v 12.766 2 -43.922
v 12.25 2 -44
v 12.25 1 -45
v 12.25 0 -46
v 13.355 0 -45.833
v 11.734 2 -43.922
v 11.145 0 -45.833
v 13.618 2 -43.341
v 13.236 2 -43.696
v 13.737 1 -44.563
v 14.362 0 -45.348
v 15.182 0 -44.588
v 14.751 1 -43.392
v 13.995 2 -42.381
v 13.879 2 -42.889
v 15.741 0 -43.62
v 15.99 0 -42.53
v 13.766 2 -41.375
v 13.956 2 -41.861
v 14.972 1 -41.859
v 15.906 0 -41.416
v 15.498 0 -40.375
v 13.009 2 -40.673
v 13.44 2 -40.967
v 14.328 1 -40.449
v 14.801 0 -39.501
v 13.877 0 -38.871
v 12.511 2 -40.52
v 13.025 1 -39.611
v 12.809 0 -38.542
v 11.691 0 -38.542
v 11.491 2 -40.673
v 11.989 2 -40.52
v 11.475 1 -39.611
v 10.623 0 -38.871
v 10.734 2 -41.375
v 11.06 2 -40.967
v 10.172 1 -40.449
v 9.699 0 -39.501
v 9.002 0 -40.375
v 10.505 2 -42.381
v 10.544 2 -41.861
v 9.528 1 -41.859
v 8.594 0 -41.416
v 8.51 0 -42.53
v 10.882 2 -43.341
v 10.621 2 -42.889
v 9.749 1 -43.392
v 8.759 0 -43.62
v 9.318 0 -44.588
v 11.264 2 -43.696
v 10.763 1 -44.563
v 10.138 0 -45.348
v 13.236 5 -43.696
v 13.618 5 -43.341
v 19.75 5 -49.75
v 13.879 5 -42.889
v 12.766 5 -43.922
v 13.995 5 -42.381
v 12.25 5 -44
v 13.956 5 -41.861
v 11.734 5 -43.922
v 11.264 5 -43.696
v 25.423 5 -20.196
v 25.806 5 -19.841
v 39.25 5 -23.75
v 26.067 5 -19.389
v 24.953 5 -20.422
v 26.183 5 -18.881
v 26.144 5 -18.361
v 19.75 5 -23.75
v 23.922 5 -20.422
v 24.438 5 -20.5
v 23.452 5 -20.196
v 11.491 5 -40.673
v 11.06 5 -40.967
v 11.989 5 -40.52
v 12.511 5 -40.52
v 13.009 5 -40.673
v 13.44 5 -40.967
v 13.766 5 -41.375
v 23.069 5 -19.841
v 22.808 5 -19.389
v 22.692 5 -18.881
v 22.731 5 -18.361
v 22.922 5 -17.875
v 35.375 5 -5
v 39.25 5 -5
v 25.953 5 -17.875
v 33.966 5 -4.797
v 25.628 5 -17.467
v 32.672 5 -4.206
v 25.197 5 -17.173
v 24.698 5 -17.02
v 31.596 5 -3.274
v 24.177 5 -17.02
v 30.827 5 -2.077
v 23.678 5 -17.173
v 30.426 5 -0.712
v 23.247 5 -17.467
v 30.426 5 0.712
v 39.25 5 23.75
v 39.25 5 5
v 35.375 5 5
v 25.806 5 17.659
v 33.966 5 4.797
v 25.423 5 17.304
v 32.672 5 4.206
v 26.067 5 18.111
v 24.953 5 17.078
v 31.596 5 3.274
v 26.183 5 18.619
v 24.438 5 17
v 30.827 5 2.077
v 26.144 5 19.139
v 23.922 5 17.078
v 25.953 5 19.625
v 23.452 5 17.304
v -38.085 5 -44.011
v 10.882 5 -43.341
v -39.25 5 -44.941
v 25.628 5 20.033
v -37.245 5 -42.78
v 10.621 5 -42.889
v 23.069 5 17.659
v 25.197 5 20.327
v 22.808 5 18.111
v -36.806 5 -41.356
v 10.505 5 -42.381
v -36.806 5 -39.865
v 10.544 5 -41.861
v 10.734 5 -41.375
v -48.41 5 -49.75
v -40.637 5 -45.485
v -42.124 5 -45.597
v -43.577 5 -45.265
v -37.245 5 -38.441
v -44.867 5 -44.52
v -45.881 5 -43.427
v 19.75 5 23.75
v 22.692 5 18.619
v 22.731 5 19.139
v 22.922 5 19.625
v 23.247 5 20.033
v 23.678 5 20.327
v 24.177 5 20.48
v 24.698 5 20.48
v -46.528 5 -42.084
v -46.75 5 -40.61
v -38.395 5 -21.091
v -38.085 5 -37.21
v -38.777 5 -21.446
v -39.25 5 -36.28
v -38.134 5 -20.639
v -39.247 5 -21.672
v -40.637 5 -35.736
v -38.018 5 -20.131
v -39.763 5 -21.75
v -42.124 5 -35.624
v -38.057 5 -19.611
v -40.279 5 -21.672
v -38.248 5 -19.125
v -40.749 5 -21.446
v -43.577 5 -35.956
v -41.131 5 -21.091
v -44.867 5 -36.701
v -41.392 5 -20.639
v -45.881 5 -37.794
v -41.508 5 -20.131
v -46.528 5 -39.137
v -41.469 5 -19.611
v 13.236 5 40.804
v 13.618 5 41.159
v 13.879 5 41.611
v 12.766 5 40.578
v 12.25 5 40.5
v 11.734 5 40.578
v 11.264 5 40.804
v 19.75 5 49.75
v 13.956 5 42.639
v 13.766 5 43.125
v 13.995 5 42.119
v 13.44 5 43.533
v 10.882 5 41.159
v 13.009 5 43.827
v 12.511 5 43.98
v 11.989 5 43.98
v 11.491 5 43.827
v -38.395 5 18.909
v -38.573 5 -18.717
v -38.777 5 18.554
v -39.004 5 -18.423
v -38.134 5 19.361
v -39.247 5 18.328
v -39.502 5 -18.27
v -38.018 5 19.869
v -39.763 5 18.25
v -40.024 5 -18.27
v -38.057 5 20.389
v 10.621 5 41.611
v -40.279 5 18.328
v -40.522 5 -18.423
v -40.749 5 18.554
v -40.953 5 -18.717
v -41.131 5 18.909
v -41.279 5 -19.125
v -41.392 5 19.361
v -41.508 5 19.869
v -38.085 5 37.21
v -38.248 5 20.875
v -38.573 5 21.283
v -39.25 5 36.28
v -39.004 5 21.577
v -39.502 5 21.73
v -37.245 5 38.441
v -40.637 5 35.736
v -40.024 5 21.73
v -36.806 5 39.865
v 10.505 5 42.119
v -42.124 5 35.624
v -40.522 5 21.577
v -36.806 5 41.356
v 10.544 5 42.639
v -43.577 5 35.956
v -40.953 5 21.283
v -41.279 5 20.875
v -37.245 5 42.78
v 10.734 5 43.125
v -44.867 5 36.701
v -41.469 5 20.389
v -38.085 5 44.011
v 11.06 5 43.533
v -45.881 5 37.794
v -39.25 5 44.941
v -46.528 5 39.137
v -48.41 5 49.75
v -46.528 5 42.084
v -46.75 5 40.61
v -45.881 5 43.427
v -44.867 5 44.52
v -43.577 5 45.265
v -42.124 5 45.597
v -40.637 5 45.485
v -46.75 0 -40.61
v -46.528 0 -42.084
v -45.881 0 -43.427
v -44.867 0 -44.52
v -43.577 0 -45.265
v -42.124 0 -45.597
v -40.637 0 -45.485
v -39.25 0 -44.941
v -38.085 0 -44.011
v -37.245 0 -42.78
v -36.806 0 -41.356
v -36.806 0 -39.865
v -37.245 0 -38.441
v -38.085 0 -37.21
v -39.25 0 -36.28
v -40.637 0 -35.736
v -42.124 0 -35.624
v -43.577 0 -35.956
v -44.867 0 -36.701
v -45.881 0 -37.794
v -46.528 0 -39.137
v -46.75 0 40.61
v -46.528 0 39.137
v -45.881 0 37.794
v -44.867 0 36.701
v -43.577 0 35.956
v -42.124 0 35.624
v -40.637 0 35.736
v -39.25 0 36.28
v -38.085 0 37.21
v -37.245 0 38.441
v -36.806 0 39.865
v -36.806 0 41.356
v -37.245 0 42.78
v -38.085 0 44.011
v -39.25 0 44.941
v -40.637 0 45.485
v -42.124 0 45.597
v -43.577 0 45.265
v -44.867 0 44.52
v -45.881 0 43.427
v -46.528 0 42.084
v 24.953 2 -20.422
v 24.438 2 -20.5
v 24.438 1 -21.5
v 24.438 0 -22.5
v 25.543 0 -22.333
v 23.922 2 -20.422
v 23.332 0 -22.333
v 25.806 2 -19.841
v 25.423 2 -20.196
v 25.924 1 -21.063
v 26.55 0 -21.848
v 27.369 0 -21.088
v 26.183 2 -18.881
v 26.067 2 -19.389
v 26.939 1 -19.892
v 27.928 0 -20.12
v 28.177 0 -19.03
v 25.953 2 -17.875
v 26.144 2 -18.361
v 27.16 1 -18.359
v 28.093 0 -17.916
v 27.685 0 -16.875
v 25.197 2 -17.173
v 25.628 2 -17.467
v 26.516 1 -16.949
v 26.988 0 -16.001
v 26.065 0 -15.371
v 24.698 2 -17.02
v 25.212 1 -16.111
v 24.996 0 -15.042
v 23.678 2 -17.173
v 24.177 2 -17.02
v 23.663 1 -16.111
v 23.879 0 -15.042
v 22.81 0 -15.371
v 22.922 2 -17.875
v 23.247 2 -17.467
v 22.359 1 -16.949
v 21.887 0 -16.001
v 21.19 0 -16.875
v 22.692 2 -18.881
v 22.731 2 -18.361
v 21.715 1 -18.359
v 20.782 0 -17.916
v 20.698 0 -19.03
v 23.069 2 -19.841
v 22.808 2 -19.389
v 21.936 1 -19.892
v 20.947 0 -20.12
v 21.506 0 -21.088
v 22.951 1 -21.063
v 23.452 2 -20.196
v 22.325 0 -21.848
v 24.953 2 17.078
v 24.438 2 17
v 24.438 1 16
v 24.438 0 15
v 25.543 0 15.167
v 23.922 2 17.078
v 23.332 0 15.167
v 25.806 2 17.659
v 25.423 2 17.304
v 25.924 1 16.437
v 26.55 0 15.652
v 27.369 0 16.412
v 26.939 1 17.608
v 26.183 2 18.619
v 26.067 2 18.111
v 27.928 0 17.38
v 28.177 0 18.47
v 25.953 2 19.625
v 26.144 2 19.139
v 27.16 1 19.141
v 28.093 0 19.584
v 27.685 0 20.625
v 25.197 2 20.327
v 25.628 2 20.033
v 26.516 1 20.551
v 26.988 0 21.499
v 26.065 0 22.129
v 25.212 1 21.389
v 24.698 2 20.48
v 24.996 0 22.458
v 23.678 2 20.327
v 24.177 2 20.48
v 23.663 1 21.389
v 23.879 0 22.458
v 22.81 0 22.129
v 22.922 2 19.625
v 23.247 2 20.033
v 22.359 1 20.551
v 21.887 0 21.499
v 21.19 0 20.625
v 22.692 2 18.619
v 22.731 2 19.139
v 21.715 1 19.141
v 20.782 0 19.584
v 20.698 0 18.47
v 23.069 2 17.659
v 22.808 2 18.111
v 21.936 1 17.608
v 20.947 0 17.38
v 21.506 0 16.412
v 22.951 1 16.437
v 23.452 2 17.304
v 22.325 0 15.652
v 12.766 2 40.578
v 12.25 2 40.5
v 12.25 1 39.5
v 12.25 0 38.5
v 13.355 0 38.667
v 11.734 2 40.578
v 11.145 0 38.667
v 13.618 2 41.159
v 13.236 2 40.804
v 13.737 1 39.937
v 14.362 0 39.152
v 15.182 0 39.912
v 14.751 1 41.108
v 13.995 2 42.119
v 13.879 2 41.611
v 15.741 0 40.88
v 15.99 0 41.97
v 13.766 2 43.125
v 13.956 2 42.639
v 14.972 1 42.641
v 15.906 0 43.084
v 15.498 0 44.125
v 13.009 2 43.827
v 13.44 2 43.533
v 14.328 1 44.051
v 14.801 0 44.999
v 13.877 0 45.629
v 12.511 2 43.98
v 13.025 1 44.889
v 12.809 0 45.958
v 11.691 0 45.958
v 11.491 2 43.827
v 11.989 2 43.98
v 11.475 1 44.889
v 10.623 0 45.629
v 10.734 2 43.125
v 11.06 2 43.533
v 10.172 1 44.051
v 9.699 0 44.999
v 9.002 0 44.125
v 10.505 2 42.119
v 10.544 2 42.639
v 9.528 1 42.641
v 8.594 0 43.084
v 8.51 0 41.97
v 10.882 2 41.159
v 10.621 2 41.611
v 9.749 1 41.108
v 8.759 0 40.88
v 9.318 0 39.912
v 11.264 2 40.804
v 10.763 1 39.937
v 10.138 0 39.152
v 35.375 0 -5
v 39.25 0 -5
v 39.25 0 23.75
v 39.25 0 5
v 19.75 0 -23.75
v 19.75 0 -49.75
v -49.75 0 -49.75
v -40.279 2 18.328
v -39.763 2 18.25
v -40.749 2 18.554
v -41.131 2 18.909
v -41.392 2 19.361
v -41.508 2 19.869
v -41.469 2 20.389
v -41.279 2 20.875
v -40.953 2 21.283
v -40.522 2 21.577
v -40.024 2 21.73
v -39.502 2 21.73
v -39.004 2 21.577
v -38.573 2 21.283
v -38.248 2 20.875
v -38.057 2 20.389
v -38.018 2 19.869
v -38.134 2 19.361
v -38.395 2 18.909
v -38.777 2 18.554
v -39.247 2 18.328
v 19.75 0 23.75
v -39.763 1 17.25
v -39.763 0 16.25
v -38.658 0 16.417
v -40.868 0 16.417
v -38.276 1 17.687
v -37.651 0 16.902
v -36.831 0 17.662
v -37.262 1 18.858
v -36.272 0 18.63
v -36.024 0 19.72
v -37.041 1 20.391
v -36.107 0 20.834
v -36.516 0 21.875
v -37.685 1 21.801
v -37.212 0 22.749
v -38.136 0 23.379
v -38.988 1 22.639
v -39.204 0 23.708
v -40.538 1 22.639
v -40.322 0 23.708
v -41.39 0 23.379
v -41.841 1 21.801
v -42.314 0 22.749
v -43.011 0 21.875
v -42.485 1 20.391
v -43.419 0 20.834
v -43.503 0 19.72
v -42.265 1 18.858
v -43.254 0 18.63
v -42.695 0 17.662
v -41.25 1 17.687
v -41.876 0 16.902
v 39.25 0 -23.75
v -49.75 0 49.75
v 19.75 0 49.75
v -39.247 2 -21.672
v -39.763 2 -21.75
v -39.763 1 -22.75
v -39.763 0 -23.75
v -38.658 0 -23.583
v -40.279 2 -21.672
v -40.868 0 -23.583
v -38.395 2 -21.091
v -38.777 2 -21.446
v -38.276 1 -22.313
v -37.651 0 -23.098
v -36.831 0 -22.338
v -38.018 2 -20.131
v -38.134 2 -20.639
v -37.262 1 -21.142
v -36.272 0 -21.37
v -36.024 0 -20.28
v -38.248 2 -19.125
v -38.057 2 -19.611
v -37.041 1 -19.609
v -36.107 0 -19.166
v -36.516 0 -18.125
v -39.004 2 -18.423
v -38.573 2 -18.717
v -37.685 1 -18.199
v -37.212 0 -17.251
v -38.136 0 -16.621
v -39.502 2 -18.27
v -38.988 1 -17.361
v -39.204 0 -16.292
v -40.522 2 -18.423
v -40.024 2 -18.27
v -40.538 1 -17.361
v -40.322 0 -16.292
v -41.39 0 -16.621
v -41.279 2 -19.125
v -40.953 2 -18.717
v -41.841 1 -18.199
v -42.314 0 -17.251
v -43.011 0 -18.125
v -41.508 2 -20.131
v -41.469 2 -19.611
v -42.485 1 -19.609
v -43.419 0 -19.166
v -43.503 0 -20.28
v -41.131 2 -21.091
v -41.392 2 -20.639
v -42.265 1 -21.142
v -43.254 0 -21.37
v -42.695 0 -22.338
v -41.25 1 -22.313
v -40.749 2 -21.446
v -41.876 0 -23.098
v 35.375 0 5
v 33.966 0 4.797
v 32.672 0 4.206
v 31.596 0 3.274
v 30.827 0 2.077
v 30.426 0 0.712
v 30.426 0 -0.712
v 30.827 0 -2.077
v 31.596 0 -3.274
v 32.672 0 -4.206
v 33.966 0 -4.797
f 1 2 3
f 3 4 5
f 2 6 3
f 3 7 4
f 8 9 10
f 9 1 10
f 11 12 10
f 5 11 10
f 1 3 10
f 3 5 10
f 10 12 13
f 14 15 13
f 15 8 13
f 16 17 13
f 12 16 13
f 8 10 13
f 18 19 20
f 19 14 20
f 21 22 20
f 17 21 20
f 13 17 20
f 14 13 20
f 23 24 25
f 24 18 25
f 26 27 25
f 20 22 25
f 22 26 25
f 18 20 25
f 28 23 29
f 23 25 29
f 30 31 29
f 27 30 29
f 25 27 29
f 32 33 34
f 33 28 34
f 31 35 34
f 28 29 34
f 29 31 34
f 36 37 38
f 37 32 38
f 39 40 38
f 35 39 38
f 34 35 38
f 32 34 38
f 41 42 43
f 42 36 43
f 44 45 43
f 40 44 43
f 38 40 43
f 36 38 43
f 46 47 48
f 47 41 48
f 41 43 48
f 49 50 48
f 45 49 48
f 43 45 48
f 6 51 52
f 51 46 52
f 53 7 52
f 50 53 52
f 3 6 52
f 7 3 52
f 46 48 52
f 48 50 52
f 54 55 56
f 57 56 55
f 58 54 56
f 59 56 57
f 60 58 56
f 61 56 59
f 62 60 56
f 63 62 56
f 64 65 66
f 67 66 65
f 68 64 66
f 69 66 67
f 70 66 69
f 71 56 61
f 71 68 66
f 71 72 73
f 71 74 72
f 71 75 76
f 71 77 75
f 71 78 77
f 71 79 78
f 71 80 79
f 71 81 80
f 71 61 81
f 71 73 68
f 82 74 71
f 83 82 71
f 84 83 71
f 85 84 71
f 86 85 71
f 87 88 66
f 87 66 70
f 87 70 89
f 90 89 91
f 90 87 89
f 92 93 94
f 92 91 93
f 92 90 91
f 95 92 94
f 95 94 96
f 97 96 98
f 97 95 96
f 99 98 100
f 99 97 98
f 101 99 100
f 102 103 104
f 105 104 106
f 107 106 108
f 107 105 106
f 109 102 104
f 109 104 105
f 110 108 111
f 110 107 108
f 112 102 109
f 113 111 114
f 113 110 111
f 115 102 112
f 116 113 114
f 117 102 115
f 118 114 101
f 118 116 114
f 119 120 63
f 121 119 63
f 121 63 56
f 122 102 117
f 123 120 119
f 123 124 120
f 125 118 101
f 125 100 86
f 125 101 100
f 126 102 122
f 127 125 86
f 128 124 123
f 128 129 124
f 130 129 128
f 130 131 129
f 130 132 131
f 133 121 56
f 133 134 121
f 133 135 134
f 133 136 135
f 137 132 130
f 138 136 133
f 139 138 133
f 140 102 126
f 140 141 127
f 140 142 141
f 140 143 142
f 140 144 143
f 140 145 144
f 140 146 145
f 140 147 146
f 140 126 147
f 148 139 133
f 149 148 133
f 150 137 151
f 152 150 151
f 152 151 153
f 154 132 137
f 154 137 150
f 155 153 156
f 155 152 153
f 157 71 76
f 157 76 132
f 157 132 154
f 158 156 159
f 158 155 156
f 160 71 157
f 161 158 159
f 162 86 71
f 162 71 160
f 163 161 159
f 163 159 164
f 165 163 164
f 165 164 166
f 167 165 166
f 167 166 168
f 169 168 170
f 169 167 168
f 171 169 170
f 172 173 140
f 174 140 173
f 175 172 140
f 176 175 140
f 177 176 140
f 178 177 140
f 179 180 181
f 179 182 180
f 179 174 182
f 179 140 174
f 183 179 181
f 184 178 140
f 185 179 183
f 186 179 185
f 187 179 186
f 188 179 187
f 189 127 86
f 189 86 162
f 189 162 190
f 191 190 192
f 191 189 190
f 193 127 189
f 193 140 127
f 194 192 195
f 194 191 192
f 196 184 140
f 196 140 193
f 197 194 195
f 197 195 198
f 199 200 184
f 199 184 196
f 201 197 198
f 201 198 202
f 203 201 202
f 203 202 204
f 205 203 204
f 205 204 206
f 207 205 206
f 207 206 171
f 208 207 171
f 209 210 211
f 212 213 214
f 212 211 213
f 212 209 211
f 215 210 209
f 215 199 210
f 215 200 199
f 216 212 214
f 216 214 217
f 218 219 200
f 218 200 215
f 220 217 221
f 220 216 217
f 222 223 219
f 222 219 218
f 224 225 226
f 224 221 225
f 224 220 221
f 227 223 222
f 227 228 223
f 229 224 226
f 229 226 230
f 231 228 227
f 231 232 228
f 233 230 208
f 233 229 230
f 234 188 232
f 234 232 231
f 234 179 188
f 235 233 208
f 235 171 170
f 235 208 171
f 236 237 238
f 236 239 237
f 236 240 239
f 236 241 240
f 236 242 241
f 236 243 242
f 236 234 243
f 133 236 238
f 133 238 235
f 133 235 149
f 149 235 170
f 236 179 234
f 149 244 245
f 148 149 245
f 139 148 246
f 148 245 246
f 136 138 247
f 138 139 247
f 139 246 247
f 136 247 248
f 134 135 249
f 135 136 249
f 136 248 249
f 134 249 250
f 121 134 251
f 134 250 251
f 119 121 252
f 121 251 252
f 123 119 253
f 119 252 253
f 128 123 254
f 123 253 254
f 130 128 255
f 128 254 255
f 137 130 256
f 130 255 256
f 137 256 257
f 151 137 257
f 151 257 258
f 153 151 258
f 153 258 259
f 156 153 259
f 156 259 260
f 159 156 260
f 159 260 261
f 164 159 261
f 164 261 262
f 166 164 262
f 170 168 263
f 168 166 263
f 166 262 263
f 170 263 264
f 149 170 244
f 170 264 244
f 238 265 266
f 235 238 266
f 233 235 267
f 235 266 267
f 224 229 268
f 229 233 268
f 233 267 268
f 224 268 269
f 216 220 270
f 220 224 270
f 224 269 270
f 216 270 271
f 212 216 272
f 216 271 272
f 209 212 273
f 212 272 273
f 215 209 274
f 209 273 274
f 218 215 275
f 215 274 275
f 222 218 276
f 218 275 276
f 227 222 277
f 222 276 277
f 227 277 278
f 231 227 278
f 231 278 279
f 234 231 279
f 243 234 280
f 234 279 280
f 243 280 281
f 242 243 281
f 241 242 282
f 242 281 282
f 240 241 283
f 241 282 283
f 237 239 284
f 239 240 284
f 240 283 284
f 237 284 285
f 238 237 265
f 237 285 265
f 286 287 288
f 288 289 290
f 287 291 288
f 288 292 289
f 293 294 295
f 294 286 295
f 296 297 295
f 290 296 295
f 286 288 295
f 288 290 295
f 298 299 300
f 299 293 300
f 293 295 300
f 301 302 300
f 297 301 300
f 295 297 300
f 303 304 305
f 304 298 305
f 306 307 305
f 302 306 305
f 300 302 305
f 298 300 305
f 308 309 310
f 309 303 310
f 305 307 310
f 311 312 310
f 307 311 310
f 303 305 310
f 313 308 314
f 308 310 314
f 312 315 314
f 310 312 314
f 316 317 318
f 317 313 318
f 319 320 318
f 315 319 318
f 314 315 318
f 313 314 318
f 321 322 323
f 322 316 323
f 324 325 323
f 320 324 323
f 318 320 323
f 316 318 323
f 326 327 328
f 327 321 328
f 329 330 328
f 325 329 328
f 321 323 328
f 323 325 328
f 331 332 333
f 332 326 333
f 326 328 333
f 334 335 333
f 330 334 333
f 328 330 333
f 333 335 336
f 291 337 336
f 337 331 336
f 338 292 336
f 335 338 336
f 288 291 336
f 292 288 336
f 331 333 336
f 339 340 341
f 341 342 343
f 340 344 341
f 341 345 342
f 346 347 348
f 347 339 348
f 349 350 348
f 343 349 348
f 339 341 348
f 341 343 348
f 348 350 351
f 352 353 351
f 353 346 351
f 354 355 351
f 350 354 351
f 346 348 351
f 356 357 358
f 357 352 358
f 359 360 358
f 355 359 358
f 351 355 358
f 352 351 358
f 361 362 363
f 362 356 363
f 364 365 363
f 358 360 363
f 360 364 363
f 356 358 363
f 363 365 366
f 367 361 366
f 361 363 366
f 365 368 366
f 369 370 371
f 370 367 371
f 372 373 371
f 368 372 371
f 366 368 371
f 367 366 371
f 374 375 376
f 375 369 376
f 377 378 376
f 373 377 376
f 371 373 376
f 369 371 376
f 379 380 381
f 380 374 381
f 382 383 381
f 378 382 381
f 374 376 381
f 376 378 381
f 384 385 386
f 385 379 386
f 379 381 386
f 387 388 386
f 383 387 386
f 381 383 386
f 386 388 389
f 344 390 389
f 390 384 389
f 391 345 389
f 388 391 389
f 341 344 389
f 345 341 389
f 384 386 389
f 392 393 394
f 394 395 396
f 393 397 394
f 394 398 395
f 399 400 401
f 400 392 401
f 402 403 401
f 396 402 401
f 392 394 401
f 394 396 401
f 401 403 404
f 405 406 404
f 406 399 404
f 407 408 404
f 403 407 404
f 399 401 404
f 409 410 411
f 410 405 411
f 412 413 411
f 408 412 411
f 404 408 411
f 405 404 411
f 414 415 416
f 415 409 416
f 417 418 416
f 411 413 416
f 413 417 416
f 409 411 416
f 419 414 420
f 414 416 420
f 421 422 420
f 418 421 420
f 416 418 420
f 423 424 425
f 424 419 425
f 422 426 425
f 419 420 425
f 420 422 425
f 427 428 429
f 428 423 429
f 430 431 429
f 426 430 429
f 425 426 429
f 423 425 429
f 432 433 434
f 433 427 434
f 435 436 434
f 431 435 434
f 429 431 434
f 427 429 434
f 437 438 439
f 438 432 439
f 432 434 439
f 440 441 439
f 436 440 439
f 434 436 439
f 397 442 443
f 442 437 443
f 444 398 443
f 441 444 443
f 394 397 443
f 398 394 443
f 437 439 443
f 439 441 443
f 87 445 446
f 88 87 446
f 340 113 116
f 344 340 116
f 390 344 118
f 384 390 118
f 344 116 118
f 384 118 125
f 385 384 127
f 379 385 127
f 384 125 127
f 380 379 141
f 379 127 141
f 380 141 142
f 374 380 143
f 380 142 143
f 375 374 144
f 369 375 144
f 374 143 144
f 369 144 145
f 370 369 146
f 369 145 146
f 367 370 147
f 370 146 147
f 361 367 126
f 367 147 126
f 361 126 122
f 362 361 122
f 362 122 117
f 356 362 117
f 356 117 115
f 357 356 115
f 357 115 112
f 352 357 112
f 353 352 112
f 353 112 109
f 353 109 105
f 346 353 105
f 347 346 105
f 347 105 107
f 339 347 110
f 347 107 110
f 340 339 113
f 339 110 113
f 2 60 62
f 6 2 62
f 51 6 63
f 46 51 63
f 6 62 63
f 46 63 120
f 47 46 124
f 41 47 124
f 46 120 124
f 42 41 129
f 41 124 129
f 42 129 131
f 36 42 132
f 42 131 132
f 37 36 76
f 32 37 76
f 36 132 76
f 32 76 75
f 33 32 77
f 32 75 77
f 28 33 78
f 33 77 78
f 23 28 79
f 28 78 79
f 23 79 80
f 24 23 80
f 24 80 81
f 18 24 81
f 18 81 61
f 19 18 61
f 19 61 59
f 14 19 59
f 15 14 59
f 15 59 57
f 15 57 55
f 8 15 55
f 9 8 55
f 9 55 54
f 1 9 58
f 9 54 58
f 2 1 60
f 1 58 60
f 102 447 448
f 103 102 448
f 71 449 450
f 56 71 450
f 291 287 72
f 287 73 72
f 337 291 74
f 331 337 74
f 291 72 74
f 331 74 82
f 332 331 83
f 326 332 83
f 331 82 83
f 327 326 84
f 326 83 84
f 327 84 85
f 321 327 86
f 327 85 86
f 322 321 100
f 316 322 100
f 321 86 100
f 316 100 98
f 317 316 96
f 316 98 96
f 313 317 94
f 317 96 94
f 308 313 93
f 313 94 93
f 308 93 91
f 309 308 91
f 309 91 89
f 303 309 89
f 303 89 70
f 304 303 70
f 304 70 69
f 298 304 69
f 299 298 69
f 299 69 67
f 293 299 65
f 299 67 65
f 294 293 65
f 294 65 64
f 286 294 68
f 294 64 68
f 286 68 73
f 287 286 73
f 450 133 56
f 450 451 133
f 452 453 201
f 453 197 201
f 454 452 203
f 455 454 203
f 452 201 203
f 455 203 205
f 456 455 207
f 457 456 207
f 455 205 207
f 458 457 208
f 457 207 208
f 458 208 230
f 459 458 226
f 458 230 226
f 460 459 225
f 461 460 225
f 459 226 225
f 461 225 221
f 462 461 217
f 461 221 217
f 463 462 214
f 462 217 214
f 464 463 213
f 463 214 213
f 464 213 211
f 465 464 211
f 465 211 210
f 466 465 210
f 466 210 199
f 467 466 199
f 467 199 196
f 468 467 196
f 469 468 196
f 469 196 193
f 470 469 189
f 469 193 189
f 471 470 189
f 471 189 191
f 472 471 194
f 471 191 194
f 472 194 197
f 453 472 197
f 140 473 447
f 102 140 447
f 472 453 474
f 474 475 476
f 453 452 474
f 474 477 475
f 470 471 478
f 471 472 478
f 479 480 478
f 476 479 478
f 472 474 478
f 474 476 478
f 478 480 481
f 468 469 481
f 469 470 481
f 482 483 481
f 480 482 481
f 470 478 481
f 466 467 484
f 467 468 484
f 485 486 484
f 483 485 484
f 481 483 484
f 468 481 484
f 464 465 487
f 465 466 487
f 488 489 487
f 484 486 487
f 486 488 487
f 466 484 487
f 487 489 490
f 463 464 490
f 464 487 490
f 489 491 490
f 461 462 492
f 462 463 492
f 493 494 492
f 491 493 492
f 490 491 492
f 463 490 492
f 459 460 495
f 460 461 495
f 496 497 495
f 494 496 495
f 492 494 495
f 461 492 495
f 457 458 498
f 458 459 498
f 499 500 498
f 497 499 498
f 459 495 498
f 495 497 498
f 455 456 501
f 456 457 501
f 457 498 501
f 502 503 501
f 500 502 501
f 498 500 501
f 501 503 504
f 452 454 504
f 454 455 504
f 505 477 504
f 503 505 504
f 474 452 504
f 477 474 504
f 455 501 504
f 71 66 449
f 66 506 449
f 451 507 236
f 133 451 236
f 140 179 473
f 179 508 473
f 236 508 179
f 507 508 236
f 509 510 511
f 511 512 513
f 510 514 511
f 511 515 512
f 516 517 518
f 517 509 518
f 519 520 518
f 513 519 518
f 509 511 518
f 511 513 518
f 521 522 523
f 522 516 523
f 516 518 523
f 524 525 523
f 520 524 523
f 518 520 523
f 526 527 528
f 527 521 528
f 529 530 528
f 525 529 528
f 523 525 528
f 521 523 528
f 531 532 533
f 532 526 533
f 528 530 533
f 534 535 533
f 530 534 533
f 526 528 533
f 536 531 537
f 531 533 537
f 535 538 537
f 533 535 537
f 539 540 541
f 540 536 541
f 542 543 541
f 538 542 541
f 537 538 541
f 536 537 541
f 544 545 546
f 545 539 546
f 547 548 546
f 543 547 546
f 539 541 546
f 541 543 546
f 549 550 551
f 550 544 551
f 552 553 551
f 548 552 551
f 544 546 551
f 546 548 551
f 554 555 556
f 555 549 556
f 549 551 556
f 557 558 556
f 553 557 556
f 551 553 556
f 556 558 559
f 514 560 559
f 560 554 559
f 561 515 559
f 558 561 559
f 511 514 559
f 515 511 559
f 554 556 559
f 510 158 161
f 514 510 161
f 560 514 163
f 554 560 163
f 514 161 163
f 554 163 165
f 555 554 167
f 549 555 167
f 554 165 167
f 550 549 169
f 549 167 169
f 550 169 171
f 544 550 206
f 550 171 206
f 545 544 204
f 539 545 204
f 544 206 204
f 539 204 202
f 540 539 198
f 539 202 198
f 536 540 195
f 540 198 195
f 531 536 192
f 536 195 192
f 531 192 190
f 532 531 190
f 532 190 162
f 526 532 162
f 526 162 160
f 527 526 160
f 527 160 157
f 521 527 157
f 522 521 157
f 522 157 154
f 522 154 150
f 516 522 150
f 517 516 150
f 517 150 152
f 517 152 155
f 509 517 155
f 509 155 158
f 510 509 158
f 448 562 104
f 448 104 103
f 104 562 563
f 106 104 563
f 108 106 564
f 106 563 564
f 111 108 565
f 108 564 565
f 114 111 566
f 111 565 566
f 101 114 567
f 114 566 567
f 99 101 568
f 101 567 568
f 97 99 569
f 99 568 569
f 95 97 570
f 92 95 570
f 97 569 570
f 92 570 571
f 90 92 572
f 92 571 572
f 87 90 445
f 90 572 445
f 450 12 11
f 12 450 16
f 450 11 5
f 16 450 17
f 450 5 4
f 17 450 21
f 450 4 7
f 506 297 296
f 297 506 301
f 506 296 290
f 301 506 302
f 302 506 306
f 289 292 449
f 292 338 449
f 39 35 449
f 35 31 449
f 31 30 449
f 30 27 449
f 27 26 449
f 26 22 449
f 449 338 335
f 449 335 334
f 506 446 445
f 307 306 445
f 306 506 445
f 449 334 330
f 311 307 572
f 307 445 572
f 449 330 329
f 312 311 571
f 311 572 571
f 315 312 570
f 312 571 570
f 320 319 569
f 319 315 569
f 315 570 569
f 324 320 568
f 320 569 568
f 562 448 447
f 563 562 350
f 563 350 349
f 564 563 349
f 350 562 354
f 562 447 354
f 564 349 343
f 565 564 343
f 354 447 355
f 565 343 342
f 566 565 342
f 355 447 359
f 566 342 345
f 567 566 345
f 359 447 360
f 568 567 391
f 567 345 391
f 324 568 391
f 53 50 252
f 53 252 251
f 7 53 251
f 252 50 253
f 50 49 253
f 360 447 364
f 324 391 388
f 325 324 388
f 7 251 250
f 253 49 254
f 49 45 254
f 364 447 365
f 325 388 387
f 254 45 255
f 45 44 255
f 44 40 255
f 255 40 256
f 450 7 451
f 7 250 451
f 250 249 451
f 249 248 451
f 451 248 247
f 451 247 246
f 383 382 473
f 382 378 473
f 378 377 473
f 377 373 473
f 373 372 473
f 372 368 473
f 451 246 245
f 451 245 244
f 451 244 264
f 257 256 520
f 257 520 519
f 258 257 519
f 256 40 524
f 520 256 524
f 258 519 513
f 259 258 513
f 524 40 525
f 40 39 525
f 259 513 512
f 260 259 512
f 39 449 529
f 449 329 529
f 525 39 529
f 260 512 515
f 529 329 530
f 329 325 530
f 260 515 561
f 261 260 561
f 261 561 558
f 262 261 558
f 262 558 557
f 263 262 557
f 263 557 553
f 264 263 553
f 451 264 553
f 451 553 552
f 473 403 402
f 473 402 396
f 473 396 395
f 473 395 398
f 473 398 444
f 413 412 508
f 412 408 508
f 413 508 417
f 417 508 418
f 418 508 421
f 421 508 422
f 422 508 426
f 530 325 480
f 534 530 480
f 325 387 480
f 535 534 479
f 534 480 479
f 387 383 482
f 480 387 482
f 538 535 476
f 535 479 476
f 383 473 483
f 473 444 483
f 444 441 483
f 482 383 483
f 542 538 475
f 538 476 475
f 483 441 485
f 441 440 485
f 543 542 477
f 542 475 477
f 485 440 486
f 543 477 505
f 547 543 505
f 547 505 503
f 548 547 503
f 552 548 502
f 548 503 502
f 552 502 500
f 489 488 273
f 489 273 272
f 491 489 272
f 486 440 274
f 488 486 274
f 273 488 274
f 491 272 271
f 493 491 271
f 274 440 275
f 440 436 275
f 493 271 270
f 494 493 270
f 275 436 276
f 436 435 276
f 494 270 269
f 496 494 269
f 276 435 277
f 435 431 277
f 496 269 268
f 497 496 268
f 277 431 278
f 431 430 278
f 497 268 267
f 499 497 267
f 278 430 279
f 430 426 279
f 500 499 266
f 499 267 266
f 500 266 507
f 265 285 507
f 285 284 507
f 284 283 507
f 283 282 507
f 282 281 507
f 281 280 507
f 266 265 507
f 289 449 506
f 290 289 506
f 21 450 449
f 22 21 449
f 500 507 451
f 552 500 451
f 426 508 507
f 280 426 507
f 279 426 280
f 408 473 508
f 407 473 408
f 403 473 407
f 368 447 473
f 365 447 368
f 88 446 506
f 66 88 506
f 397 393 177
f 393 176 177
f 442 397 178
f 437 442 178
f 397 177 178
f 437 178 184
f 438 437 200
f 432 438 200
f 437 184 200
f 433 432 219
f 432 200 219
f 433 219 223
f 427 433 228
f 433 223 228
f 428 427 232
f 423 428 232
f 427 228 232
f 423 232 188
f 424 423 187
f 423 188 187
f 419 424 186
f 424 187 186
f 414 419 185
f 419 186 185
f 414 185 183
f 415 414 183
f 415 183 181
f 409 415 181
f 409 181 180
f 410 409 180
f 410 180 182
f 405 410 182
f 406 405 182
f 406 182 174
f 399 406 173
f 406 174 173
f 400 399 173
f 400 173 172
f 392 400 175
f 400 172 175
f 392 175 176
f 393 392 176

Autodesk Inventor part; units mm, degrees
ref_plane "YZ Plane" through (0, 0, 0) normal (1, 0, 0) x (0, 1, 0)
ref_plane "XZ Plane" through (0, 0, 0) normal (0, 1, 0) x (-1, 0, 0)
ref_plane "XY Plane" through (0, 0, 0) normal (0, 0, 1) x (1, 0, 0)
sketch "Náčrt1" plane through (0, 0, 0) normal (0, 1, 0) x (-1, 0, 0)
  line L0 (-49.75, 49.75) -> (49.75, 49.75)
  line L1 (49.75, 49.75) -> (49.75, -49.75)
  line L2 (49.75, -49.75) -> (-49.75, -49.75)
  line L3 (-49.75, -49.75) -> (-49.75, 49.75)
  line L4 (-49.75, 49.75) -> (49.75, -49.75) construction
  line L5 (49.75, 49.75) -> (-49.75, -49.75) construction
  line L6 (-19.75, 49.75) -> (-19.75, 23.75)
  line L7 (-19.75, 23.75) -> (-49.75, 23.75)
  line L8 (-49.75, -23.75) -> (-19.75, -23.75)
  line L9 (-19.75, -23.75) -> (-19.75, -49.75)
  circle A0 centre (-24.4375, -18.75) radius 1.75
  circle A1 centre (-24.4375, 18.75) radius 1.75
  line L10 (-39.25, 23.75) -> (-39.25, -23.75)
  circle A2 centre (-12.25, -42.25) radius 1.75
  circle A3 centre (39.7631, -20) radius 1.75
  circle A4 centre (39.7631, 20) radius 1.75
  circle A5 centre (-12.25, 42.25) radius 1.75
  circle A6 centre (41.75, 40.6105) radius 5
  circle A7 centre (41.75, -40.6105) radius 5
  line L11 (41.75, 40.6105) -> (41.75, 49.75) construction
  line L12 (41.75, -40.6105) -> (41.75, -49.75) construction
  circle A8 centre (-35.375, 0) radius 5
  line L13 (-35.375, 5) -> (-39.25, 5)
  line L14 (-35.375, -5) -> (-39.25, -5)
  line L15 (39.7631, 20) -> (39.7631, 0) construction
  line L16 (39.7631, 0) -> (39.7631, -20) construction
  point P0 (0, 0)
  point P1 (-34.75, 23.75)
  dimension "d0" = 99.5
  dimension "d1" = 99.5
  dimension "d2" = 30
  dimension "d3" = 26
  dimension "d4" = 10.5
  dimension "d5" = 3.5
  dimension "d7" = 7.5
  dimension "d8" = 7.5
  dimension "d9" = 5
  dimension "d10" = 5
  dimension "d11" = 10.3125
  dimension "d12" = 7.5
  dimension "d13" = 9.9869
  dimension "d26" = 81.221
  dimension "d27" = 10
  dimension "d28" = 8
  dimension "d29" = 10
  dimension "d30" = 3.875
  dimension "d31" = 40
extrude "Vysunutí1" add sketch "Náčrt1" along normal blind 5 contours L0 L1 L2 L9 L8 L10 L14 A8 L13 L7 L6 | A0 | A1 | A2 | A3 | A4 | A5
sketch "Náčrt2" plane through (-49.75, 0, 49.75) normal (0, 0, 1) x (1, 0, 0)
  line L0 (0, 0) -> (69.5, 0) projected
  line L1 (0, 0) -> (1.3397, 5)
  line L2 (0, 5) -> (69.5, 5) projected
  line L3 (0, 0) -> (0, 5) projected
  line L4 (0, 5) -> (0, 0)
  point P0 (49.75, 0)
  dimension "d16" = 75
extrude "Vysunutí2" cut sketch "Náčrt2" against normal through all
hole "Díra1" at (24.4375, 0, 18.75) at (24.4375, 0, -18.75) at (12.25, 0, -42.25) at (-39.7631, 0, -20) at (-39.7631, 0, 20) at (12.25, 0, 42.25) direction (0, 1, 0) diameter 3.5 end through all countersink diameter 7.5 countersink angle 90
properties part number "new_plech"
